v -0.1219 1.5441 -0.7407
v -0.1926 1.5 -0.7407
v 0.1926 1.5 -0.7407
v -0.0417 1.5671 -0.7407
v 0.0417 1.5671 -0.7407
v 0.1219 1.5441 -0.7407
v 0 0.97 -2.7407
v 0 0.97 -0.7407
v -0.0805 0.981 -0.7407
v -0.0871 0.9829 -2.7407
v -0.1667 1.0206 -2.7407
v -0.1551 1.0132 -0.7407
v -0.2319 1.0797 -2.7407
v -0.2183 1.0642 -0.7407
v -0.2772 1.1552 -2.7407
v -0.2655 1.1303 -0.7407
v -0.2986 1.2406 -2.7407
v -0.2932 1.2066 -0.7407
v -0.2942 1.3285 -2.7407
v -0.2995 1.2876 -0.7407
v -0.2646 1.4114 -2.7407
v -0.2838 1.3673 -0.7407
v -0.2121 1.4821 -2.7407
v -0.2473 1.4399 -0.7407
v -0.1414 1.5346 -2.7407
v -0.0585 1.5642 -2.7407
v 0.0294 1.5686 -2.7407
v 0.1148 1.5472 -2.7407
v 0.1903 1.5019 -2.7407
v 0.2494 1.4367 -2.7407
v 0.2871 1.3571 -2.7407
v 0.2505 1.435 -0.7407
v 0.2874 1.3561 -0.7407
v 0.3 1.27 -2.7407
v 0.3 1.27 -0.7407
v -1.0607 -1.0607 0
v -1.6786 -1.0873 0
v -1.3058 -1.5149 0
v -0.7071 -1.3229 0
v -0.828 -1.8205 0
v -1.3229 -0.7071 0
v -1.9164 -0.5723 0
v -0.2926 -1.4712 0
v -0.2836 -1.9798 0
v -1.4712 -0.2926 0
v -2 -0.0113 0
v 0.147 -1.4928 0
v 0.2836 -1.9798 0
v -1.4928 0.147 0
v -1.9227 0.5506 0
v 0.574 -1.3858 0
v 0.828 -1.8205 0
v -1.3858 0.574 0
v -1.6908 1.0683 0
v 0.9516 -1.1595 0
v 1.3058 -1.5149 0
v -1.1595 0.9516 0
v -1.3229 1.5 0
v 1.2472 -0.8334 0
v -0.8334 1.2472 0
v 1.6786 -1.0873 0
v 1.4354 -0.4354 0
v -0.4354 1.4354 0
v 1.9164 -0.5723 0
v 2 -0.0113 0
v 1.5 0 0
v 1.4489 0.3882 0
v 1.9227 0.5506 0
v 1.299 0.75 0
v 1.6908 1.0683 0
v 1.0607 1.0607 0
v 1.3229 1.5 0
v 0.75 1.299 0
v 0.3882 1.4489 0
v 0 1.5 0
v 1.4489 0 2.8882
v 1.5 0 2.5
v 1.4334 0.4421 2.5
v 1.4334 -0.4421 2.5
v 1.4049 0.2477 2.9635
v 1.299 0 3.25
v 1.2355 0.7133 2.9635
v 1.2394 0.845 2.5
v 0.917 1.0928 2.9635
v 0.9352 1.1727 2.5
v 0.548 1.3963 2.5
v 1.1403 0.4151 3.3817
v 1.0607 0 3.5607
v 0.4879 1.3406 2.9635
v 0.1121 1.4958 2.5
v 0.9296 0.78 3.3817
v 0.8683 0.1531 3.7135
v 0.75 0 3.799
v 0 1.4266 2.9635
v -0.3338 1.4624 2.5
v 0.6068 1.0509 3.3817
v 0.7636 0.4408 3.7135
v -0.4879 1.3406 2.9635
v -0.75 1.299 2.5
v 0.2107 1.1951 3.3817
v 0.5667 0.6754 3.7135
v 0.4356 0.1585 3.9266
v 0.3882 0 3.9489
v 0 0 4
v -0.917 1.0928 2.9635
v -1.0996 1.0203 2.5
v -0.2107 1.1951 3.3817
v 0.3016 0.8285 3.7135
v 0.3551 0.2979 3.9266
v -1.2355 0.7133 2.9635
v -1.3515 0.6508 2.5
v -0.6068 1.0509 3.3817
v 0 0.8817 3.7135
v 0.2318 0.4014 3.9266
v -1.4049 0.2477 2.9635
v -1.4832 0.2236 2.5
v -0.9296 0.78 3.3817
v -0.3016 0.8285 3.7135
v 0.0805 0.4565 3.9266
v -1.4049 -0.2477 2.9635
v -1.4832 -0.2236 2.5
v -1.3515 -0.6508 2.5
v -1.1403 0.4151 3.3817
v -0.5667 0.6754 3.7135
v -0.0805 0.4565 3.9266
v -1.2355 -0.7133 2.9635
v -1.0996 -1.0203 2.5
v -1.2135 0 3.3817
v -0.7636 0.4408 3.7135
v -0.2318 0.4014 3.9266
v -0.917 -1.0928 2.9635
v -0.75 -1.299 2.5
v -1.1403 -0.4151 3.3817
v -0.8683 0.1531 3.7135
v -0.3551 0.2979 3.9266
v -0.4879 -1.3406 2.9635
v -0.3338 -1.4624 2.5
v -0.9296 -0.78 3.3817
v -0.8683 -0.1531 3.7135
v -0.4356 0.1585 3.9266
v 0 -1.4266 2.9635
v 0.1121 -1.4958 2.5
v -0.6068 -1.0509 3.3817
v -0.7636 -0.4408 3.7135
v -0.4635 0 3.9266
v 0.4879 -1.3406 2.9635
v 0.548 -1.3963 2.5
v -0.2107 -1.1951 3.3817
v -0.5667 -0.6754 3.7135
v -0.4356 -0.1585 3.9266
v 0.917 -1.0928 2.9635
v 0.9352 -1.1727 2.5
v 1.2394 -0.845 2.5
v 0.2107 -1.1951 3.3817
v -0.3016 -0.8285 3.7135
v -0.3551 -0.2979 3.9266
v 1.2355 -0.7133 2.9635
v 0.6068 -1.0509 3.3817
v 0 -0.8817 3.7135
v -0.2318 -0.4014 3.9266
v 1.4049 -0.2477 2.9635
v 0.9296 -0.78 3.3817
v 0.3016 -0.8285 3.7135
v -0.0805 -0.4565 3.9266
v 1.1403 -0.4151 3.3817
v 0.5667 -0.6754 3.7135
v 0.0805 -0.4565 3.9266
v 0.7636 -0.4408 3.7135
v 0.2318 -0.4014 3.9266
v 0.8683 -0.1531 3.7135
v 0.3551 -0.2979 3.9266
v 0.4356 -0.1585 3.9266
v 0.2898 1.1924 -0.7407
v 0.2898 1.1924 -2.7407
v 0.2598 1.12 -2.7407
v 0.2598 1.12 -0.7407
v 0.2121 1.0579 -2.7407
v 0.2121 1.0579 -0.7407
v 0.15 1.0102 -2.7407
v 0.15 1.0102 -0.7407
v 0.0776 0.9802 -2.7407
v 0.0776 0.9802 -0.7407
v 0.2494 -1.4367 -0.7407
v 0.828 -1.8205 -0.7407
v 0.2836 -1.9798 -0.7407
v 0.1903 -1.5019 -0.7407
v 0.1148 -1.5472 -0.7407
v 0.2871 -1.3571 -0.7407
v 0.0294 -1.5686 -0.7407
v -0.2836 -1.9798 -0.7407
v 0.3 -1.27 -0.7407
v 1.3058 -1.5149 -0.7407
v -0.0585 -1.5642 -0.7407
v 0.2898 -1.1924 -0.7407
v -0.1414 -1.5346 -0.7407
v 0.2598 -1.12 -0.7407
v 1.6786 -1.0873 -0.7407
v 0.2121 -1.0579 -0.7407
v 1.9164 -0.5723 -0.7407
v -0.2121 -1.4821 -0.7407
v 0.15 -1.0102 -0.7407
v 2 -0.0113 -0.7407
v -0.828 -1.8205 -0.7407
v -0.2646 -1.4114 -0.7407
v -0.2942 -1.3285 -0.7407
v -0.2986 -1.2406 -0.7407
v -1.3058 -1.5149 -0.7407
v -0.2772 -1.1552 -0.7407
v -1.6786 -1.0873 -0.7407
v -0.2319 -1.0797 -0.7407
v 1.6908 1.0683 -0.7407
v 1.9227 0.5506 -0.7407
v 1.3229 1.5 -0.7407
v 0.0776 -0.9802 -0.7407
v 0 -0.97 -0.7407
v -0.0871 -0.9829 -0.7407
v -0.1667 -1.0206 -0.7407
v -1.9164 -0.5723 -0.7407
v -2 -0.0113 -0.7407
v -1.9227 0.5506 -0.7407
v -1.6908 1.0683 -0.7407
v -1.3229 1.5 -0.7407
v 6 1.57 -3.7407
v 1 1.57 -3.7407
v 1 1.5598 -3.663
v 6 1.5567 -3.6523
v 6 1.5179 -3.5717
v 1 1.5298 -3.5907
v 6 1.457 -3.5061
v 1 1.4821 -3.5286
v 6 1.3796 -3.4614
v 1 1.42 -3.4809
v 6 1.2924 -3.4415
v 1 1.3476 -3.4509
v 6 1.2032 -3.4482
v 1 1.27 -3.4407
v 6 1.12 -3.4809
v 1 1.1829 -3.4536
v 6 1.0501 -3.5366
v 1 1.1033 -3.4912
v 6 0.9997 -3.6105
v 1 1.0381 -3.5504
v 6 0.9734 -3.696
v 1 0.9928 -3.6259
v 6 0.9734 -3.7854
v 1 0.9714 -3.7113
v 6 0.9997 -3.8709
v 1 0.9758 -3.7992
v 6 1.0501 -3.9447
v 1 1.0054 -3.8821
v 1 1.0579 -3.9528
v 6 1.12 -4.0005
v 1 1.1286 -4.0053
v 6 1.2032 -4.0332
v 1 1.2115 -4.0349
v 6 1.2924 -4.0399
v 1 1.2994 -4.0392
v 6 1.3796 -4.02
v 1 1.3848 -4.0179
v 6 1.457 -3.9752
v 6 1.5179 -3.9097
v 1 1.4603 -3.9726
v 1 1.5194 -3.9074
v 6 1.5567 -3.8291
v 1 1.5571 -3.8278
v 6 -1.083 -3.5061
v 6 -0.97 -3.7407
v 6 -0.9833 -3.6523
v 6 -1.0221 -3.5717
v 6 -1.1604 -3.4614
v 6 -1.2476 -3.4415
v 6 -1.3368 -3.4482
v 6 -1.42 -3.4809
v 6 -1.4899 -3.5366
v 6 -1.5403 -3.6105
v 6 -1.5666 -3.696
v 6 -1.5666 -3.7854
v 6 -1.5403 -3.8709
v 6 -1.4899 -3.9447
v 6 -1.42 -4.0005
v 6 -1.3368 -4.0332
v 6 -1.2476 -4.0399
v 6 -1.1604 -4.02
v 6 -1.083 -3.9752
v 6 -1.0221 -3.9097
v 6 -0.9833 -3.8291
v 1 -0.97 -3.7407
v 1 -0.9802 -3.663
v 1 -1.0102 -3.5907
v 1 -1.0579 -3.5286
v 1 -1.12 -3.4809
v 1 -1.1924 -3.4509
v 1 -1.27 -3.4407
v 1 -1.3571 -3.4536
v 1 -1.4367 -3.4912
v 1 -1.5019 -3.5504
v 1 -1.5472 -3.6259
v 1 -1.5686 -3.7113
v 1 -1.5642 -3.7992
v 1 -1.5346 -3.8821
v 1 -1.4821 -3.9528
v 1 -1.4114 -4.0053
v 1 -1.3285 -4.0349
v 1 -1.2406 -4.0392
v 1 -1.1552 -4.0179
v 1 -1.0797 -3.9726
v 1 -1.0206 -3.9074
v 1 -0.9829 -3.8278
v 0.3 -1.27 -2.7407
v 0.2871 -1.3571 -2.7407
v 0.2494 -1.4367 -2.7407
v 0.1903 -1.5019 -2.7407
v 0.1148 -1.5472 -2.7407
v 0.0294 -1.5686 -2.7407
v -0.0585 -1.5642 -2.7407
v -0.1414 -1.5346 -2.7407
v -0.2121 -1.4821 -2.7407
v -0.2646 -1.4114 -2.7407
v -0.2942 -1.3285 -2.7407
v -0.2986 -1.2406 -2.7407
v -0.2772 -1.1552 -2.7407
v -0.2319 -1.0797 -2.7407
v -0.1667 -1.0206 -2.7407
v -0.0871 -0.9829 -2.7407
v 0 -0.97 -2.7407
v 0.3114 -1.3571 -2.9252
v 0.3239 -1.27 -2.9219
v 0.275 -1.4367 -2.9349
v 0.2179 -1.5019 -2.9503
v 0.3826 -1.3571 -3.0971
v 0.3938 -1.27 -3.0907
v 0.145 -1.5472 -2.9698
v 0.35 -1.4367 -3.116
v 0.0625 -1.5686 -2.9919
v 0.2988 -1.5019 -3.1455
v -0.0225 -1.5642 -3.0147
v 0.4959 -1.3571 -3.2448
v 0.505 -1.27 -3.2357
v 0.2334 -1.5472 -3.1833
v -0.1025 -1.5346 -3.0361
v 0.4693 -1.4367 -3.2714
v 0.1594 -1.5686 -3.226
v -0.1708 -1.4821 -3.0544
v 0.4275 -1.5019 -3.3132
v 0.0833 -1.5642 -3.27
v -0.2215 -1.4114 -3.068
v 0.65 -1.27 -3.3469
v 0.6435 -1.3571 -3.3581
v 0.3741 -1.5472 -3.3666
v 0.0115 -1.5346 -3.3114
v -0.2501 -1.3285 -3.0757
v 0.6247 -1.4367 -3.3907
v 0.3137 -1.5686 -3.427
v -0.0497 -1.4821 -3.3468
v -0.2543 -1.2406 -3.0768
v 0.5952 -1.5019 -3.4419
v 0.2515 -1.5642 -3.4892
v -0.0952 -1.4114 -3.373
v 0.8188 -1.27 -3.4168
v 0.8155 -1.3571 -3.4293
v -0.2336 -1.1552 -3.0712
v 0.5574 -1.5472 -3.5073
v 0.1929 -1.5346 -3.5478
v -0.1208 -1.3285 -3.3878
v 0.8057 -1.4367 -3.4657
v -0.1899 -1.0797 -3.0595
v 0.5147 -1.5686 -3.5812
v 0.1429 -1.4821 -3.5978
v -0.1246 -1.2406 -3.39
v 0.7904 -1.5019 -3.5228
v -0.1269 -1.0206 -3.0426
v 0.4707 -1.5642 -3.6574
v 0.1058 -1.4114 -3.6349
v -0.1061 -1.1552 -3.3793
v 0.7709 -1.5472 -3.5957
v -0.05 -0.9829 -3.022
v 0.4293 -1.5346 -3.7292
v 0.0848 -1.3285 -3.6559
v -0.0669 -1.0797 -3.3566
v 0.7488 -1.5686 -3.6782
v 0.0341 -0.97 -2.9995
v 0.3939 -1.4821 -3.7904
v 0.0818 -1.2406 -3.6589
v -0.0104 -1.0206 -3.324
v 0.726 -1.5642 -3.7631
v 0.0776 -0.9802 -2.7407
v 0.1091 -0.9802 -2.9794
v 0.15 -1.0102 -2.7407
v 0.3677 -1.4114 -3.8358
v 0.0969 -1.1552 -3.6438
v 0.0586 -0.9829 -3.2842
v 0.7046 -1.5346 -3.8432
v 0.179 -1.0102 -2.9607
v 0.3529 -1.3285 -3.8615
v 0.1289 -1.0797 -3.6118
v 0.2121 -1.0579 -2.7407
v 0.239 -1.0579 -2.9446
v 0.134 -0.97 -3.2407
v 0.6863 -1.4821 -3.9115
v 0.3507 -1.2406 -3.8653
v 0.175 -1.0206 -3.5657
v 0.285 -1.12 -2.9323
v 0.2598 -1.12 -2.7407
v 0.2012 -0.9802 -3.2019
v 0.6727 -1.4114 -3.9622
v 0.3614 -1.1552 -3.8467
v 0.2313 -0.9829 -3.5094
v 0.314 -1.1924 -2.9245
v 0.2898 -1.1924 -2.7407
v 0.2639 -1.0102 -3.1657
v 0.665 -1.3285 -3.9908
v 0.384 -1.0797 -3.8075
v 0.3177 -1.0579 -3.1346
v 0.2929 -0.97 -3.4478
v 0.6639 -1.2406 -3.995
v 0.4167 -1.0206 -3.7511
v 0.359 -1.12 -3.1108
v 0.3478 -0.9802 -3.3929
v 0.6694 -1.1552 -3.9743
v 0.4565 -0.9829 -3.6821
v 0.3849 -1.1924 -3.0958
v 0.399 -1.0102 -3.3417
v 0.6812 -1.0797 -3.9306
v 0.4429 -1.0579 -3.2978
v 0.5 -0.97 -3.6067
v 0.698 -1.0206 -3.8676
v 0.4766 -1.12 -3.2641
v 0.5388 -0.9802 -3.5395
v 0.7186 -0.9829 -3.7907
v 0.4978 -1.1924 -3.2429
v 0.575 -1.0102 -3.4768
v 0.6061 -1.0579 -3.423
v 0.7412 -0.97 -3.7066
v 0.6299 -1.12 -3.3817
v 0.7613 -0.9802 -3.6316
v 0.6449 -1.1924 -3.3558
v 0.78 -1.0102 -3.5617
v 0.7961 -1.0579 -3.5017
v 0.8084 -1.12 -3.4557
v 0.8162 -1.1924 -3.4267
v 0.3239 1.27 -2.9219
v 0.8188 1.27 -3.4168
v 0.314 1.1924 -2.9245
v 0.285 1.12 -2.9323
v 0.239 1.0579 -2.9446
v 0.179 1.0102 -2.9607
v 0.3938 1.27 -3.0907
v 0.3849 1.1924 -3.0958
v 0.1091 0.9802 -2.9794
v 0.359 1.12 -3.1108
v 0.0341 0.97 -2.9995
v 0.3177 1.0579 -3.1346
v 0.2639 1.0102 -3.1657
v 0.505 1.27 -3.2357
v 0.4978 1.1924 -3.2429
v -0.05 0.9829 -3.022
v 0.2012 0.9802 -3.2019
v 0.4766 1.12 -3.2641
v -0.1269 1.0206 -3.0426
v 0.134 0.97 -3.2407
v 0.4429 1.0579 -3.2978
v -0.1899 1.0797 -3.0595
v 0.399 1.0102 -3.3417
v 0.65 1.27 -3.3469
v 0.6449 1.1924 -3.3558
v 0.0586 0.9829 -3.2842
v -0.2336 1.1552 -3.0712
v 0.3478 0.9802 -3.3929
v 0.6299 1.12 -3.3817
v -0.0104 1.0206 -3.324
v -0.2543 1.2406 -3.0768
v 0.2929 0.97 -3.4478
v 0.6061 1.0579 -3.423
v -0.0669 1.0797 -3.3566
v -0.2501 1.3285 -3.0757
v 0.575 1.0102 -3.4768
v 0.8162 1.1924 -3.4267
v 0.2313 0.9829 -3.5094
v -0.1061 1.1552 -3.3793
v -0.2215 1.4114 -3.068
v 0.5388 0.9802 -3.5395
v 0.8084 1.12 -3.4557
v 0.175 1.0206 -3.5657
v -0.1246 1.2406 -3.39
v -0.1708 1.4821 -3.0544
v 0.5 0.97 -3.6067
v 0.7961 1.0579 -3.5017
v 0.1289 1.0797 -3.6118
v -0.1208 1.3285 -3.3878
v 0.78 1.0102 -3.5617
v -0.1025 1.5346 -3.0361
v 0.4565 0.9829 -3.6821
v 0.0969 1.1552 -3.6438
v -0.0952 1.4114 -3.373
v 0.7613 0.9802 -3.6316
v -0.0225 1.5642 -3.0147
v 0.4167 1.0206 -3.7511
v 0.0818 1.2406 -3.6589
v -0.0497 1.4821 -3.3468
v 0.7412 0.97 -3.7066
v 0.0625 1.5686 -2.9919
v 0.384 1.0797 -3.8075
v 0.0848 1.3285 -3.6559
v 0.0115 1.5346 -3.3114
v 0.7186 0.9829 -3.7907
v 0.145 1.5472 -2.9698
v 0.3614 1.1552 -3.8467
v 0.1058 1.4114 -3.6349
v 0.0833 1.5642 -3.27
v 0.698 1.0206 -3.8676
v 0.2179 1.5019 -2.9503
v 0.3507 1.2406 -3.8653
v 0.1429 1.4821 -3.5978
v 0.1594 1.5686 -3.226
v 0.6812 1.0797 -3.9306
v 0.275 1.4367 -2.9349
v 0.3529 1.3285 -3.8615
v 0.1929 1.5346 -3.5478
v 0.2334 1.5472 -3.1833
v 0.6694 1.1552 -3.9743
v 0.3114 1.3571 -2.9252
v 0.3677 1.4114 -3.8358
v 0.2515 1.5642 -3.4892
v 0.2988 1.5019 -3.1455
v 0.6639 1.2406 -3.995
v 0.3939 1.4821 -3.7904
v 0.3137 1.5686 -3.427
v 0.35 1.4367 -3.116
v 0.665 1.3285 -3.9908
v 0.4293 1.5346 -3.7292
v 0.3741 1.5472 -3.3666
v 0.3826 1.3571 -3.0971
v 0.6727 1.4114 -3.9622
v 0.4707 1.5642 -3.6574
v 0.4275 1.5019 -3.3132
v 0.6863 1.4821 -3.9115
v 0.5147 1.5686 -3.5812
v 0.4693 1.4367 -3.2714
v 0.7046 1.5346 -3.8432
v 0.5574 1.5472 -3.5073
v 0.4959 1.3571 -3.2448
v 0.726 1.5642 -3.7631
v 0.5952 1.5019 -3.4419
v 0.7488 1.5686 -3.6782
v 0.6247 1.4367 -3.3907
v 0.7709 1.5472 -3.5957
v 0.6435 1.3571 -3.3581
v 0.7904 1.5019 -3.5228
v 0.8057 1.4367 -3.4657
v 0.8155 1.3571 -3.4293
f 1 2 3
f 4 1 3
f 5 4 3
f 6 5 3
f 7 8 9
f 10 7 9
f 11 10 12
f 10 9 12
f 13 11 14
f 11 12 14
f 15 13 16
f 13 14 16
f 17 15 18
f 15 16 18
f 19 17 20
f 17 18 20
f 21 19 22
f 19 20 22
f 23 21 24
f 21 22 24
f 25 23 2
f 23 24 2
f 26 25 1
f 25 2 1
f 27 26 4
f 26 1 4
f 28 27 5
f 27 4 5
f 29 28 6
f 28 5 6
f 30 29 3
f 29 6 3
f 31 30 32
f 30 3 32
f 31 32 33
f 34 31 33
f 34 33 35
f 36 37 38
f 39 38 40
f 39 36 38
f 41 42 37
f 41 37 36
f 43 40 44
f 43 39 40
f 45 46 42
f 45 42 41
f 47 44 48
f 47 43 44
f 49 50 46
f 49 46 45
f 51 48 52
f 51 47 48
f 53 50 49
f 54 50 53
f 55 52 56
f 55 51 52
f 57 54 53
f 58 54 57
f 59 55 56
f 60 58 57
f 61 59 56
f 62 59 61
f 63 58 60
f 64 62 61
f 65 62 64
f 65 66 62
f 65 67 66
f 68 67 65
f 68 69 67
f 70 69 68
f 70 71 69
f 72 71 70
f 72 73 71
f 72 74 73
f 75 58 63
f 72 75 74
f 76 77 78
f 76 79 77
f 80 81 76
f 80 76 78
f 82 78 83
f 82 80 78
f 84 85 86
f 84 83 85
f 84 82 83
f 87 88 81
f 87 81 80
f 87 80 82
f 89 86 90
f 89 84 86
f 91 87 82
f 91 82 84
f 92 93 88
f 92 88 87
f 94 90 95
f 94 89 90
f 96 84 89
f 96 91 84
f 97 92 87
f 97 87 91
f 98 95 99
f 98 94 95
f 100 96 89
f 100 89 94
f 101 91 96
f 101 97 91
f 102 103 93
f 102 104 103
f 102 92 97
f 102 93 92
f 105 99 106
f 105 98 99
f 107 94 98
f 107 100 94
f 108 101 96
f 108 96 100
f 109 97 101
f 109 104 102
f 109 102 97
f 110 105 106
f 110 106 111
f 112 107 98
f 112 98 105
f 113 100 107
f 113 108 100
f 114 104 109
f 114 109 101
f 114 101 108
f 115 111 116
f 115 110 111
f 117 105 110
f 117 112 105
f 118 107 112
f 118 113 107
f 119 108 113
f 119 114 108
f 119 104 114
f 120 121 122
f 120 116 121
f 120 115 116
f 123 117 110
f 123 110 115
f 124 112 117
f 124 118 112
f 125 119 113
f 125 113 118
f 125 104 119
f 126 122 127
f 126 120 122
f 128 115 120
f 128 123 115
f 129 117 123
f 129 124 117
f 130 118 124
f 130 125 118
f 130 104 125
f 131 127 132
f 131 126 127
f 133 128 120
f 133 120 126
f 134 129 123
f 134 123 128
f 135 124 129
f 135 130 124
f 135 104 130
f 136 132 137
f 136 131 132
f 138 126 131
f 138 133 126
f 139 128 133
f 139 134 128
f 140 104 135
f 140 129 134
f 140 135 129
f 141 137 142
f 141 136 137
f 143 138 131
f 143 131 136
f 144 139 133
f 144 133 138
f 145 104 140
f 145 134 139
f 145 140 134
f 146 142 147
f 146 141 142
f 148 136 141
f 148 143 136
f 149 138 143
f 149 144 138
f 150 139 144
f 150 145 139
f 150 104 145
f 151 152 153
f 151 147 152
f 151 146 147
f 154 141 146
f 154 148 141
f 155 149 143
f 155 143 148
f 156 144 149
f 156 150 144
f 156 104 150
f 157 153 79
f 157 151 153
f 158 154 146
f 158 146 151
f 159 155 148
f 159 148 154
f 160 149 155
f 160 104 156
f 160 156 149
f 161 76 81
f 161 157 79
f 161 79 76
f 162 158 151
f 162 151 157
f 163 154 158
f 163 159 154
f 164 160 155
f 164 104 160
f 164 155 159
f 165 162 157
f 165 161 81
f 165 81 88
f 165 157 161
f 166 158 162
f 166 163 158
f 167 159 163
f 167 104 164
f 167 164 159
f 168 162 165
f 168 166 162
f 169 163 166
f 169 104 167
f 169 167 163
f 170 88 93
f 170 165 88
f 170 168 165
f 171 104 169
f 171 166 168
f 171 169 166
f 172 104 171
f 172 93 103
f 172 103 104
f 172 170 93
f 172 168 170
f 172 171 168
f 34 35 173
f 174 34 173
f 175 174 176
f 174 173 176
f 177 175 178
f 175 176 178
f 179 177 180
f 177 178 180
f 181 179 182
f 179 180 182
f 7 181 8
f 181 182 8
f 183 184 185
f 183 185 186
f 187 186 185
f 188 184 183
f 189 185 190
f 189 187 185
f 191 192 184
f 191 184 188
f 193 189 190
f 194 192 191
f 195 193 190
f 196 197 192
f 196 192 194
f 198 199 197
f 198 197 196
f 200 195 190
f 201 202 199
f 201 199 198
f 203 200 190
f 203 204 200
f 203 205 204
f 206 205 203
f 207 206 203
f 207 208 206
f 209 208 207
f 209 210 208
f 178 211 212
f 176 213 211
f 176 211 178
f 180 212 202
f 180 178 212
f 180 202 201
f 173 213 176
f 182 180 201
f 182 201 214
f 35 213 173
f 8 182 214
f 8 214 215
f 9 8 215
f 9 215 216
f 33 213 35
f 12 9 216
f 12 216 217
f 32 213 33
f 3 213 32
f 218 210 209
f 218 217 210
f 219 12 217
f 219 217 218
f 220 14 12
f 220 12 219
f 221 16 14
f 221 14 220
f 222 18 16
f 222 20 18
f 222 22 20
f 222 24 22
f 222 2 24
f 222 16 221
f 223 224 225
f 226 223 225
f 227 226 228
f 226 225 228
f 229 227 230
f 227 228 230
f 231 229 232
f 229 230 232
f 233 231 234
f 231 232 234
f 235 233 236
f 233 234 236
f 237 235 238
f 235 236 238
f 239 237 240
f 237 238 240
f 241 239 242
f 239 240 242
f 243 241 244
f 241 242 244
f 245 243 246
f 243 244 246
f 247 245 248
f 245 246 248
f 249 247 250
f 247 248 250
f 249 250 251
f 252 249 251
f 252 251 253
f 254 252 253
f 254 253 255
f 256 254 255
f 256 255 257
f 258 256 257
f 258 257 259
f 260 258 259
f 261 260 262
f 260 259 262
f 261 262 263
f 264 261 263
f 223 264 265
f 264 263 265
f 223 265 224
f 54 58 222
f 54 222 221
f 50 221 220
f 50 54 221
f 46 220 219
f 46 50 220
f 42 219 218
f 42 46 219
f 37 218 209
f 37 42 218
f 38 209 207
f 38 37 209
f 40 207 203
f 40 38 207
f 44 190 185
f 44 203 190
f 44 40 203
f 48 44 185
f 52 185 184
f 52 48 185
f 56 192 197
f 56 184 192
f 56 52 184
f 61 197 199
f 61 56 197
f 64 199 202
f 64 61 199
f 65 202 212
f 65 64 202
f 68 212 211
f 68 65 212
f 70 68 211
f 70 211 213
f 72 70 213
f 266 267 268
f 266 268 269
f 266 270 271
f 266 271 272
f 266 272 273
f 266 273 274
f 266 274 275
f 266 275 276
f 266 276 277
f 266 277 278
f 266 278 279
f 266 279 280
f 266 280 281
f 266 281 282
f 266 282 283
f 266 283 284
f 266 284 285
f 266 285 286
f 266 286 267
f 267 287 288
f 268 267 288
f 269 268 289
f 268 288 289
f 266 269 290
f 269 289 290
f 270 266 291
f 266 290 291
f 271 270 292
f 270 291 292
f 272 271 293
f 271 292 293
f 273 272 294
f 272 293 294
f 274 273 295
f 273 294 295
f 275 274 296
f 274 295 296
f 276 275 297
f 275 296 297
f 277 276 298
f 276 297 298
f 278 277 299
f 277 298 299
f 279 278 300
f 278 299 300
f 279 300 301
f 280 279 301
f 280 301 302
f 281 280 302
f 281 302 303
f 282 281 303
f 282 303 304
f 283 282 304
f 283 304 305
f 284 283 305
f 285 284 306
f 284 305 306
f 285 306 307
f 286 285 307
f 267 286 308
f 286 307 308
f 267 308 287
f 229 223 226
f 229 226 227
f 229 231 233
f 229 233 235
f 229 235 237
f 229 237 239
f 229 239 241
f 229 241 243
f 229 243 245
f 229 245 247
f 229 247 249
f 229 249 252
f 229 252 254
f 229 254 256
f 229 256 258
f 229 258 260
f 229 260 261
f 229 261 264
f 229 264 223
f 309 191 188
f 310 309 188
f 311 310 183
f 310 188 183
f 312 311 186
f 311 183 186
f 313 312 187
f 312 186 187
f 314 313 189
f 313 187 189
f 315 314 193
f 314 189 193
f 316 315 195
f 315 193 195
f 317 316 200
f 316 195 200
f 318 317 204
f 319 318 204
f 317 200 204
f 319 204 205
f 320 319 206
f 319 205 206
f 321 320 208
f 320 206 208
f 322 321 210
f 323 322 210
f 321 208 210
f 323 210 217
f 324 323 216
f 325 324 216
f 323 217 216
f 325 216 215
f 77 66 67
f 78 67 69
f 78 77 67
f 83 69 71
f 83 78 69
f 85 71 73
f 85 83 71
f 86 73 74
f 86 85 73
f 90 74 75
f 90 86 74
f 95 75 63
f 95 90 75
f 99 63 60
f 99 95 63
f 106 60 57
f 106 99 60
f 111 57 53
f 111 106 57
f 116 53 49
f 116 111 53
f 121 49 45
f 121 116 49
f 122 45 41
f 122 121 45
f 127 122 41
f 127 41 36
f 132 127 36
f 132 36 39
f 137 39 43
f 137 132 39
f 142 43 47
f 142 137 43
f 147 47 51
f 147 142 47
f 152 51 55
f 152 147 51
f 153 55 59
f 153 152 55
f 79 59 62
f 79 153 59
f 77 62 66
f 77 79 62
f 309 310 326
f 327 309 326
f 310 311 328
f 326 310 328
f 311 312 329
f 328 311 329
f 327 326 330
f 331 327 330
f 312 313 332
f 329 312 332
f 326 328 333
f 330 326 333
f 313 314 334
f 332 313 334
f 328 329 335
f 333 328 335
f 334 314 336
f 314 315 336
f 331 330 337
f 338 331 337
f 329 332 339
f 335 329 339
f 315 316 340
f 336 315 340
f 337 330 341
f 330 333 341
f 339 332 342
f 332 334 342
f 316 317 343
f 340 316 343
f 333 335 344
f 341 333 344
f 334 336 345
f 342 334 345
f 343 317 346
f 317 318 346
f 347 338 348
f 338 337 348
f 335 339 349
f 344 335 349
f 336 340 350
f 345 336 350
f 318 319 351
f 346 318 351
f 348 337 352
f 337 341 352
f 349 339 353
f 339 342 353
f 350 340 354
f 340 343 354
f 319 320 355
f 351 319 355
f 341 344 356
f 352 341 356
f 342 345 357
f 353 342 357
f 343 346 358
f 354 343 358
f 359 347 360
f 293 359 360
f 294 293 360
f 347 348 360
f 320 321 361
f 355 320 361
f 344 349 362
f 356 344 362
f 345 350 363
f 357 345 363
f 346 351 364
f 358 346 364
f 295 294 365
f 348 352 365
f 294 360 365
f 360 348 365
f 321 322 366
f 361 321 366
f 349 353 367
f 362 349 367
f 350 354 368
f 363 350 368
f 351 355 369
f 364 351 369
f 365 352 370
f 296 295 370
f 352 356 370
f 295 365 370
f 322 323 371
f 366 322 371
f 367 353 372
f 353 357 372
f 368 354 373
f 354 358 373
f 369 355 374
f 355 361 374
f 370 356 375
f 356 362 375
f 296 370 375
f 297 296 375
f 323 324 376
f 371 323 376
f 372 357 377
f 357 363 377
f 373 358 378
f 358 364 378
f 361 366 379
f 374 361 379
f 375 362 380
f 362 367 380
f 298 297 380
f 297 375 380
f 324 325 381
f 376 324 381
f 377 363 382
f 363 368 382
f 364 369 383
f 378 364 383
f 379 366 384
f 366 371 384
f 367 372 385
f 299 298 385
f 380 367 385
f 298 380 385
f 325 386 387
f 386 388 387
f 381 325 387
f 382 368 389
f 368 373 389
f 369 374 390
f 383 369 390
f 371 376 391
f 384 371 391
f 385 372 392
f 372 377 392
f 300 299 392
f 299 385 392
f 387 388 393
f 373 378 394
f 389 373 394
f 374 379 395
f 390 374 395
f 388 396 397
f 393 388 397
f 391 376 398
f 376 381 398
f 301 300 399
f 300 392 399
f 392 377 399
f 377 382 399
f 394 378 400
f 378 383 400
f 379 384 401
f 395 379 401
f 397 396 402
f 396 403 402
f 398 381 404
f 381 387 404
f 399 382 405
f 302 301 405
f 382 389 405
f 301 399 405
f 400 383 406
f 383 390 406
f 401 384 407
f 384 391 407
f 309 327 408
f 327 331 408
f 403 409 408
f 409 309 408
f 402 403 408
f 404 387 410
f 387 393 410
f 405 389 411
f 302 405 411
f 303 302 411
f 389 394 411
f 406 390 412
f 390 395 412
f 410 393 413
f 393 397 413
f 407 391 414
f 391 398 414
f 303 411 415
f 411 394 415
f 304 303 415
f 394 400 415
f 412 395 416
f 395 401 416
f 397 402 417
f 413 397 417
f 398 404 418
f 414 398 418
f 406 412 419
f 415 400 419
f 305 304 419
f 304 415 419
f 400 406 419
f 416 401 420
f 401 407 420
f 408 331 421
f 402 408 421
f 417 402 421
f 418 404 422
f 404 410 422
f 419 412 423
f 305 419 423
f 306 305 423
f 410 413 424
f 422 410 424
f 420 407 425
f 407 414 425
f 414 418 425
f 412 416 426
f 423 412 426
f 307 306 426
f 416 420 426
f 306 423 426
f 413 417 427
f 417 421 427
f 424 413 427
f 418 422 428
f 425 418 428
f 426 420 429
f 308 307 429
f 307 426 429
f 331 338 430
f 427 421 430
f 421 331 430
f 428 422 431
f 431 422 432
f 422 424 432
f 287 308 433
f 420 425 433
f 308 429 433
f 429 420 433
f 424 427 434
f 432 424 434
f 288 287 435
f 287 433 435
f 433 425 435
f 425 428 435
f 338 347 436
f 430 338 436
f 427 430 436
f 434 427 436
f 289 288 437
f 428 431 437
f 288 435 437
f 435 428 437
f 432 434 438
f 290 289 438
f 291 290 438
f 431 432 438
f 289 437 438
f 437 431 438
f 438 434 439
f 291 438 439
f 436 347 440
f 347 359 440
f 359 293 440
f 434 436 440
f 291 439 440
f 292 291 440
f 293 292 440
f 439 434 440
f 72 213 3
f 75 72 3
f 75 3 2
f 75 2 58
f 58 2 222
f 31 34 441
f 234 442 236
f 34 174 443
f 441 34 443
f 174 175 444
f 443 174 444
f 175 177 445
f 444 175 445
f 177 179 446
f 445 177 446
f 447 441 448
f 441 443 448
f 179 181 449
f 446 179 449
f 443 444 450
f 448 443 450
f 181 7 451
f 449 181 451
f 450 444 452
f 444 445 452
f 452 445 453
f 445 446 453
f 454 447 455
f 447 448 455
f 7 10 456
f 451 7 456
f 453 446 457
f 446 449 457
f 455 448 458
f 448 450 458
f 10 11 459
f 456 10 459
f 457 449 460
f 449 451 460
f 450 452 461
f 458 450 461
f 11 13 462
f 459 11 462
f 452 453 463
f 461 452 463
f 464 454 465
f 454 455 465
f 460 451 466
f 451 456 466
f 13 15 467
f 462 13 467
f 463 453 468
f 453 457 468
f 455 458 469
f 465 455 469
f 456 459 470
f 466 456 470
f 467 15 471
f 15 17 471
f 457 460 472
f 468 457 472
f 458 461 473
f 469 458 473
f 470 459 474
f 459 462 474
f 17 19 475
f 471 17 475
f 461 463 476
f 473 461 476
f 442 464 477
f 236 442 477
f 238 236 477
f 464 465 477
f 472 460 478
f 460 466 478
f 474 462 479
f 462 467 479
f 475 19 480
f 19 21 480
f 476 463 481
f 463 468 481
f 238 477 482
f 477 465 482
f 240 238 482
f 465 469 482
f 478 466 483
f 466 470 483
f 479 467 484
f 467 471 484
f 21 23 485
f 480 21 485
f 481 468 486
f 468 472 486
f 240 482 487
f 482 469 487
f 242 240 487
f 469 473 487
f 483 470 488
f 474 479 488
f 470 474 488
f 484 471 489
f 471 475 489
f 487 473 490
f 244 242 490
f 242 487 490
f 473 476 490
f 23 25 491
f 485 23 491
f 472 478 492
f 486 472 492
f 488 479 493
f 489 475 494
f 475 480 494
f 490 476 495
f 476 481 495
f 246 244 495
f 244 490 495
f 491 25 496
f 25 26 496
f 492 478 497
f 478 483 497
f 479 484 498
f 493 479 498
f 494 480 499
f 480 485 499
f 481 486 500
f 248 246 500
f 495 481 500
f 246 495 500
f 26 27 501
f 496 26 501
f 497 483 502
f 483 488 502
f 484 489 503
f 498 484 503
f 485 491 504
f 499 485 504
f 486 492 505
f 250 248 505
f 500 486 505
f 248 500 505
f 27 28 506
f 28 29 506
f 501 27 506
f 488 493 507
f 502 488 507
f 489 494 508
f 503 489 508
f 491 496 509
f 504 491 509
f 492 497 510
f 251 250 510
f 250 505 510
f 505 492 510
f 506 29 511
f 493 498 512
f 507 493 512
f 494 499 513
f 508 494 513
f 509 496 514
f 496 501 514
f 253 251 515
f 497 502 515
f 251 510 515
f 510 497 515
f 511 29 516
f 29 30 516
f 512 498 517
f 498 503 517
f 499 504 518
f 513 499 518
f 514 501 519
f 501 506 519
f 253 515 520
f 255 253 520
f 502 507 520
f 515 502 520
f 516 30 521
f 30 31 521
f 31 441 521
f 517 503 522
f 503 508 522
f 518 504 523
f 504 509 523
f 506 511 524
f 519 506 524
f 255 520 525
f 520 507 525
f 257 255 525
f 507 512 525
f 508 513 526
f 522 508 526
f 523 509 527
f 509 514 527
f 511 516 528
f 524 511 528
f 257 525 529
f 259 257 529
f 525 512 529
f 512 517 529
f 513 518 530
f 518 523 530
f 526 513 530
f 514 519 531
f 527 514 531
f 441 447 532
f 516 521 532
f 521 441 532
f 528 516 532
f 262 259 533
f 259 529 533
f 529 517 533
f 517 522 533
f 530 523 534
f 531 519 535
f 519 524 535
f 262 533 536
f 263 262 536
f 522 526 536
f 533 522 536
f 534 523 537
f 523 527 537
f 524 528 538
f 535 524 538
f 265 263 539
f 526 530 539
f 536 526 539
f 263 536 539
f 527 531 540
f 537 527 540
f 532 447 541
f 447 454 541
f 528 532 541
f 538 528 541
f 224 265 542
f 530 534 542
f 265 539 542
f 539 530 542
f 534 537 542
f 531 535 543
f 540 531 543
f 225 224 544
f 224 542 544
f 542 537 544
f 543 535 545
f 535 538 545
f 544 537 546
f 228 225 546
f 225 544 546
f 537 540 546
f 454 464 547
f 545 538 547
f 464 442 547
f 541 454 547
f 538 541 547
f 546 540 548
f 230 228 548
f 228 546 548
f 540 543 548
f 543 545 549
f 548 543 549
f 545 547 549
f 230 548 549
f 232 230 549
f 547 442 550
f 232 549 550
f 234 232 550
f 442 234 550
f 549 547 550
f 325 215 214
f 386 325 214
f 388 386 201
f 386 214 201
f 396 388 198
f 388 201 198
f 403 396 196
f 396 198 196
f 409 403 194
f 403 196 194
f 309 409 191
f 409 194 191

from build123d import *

# Parameters (mm, degrees)
F3_DEPTH  = 25
F5_DEPTH  = 2
F5_FACE_R = 0.3
F6_R      = 0.3
F7_ANGLE  = 90
F8_R      = 0.3
F7_FACE_R = 0.3
F9_DEPTH  = 5


with BuildPart() as f1:
    # F0 (on Front) → F1 (revolve)
    with BuildSketch(Plane.XZ):
        with BuildLine():
            Line((0, 4), (0, 0))
            Line((0, 0), (0, -0.7406895747))
            Line((0, -0.7406895747), (2, -0.7406895747))
            Line((2, -0.7406895747), (2, 0))
            Line((2, 0), (1.5, 0))
            Line((1.5, 0), (1.5, 2.5))
            ThreePointArc((1.5, 2.5), (1.0606601718, 3.5606601718), (0, 4))
        make_face()
    revolve(axis=Axis((0, 0, 2), (0, 0, 1)))

    # F2 (on face) → F3 (cut)
    with BuildSketch(Plane(origin=(0, 0, -0.7406895747), x_dir=(1, 0, 0), z_dir=(0, 0, -1))):
        with BuildLine():
            Line((1.3228756555, -1.5), (-1.3228756555, -1.5))
            ThreePointArc((-1.3228756555, -1.5), (0, -2), (1.3228756555, -1.5))
        make_face()
    extrude(amount=-F3_DEPTH, mode=Mode.SUBTRACT)

    # F4 (on face) → F5 (join)
    with BuildSketch(Plane(origin=(0, 0, -0.7406895747), x_dir=(1, 0, 0), z_dir=(0, 0, -1))):
        with BuildLine():
            ThreePointArc((0, 0.97), (0.2121320344, 1.0578679656), (0.3, 1.27))
            ThreePointArc((0.3, 1.27), (-0.2121320344, 1.4821320344), (0, 0.97))
        make_face()
        with BuildLine():
            ThreePointArc((0.3, -1.27), (0.2121320344, -1.0578679656), (0, -0.97))
            ThreePointArc((0, -0.97), (-0.2121320344, -1.4821320344), (0.3, -1.27))
        make_face()
    extrude(amount=F5_DEPTH)

    # F5_face (on face) + F6 (on face) → F7 (revolve)
    with BuildSketch(Plane(origin=(0, 1.27, -2.7406895747), x_dir=(1, 0, 0), z_dir=(0, 0, -1))):
        with Locations((0, 2.54)):
            Circle(F5_FACE_R)
    with BuildSketch(Plane(origin=(0, 0, -2.7406895747), x_dir=(1, 0, 0), z_dir=(0, 0, -1))):
        with Locations((0, -1.27)):
            Circle(F6_R)
    revolve(axis=Axis((1, 0.2732329885, -2.7406895747), (0, -1, 0)), revolution_arc=F7_ANGLE)

    # F8 (on face) + F7_face (on face) → F9 (join)
    with BuildSketch(Plane.YZ.offset(1)):
        with Locations((-1.27, -3.7406895747)):
            Circle(F8_R)
    with BuildSketch(Plane(origin=(1, -1.27, -3.7406895747), x_dir=(0, 1, 0), z_dir=(1, 0, 0))):
        with Locations((2.54, 0)):
            Circle(F7_FACE_R)
    extrude(amount=F9_DEPTH)


solid = f1.part
